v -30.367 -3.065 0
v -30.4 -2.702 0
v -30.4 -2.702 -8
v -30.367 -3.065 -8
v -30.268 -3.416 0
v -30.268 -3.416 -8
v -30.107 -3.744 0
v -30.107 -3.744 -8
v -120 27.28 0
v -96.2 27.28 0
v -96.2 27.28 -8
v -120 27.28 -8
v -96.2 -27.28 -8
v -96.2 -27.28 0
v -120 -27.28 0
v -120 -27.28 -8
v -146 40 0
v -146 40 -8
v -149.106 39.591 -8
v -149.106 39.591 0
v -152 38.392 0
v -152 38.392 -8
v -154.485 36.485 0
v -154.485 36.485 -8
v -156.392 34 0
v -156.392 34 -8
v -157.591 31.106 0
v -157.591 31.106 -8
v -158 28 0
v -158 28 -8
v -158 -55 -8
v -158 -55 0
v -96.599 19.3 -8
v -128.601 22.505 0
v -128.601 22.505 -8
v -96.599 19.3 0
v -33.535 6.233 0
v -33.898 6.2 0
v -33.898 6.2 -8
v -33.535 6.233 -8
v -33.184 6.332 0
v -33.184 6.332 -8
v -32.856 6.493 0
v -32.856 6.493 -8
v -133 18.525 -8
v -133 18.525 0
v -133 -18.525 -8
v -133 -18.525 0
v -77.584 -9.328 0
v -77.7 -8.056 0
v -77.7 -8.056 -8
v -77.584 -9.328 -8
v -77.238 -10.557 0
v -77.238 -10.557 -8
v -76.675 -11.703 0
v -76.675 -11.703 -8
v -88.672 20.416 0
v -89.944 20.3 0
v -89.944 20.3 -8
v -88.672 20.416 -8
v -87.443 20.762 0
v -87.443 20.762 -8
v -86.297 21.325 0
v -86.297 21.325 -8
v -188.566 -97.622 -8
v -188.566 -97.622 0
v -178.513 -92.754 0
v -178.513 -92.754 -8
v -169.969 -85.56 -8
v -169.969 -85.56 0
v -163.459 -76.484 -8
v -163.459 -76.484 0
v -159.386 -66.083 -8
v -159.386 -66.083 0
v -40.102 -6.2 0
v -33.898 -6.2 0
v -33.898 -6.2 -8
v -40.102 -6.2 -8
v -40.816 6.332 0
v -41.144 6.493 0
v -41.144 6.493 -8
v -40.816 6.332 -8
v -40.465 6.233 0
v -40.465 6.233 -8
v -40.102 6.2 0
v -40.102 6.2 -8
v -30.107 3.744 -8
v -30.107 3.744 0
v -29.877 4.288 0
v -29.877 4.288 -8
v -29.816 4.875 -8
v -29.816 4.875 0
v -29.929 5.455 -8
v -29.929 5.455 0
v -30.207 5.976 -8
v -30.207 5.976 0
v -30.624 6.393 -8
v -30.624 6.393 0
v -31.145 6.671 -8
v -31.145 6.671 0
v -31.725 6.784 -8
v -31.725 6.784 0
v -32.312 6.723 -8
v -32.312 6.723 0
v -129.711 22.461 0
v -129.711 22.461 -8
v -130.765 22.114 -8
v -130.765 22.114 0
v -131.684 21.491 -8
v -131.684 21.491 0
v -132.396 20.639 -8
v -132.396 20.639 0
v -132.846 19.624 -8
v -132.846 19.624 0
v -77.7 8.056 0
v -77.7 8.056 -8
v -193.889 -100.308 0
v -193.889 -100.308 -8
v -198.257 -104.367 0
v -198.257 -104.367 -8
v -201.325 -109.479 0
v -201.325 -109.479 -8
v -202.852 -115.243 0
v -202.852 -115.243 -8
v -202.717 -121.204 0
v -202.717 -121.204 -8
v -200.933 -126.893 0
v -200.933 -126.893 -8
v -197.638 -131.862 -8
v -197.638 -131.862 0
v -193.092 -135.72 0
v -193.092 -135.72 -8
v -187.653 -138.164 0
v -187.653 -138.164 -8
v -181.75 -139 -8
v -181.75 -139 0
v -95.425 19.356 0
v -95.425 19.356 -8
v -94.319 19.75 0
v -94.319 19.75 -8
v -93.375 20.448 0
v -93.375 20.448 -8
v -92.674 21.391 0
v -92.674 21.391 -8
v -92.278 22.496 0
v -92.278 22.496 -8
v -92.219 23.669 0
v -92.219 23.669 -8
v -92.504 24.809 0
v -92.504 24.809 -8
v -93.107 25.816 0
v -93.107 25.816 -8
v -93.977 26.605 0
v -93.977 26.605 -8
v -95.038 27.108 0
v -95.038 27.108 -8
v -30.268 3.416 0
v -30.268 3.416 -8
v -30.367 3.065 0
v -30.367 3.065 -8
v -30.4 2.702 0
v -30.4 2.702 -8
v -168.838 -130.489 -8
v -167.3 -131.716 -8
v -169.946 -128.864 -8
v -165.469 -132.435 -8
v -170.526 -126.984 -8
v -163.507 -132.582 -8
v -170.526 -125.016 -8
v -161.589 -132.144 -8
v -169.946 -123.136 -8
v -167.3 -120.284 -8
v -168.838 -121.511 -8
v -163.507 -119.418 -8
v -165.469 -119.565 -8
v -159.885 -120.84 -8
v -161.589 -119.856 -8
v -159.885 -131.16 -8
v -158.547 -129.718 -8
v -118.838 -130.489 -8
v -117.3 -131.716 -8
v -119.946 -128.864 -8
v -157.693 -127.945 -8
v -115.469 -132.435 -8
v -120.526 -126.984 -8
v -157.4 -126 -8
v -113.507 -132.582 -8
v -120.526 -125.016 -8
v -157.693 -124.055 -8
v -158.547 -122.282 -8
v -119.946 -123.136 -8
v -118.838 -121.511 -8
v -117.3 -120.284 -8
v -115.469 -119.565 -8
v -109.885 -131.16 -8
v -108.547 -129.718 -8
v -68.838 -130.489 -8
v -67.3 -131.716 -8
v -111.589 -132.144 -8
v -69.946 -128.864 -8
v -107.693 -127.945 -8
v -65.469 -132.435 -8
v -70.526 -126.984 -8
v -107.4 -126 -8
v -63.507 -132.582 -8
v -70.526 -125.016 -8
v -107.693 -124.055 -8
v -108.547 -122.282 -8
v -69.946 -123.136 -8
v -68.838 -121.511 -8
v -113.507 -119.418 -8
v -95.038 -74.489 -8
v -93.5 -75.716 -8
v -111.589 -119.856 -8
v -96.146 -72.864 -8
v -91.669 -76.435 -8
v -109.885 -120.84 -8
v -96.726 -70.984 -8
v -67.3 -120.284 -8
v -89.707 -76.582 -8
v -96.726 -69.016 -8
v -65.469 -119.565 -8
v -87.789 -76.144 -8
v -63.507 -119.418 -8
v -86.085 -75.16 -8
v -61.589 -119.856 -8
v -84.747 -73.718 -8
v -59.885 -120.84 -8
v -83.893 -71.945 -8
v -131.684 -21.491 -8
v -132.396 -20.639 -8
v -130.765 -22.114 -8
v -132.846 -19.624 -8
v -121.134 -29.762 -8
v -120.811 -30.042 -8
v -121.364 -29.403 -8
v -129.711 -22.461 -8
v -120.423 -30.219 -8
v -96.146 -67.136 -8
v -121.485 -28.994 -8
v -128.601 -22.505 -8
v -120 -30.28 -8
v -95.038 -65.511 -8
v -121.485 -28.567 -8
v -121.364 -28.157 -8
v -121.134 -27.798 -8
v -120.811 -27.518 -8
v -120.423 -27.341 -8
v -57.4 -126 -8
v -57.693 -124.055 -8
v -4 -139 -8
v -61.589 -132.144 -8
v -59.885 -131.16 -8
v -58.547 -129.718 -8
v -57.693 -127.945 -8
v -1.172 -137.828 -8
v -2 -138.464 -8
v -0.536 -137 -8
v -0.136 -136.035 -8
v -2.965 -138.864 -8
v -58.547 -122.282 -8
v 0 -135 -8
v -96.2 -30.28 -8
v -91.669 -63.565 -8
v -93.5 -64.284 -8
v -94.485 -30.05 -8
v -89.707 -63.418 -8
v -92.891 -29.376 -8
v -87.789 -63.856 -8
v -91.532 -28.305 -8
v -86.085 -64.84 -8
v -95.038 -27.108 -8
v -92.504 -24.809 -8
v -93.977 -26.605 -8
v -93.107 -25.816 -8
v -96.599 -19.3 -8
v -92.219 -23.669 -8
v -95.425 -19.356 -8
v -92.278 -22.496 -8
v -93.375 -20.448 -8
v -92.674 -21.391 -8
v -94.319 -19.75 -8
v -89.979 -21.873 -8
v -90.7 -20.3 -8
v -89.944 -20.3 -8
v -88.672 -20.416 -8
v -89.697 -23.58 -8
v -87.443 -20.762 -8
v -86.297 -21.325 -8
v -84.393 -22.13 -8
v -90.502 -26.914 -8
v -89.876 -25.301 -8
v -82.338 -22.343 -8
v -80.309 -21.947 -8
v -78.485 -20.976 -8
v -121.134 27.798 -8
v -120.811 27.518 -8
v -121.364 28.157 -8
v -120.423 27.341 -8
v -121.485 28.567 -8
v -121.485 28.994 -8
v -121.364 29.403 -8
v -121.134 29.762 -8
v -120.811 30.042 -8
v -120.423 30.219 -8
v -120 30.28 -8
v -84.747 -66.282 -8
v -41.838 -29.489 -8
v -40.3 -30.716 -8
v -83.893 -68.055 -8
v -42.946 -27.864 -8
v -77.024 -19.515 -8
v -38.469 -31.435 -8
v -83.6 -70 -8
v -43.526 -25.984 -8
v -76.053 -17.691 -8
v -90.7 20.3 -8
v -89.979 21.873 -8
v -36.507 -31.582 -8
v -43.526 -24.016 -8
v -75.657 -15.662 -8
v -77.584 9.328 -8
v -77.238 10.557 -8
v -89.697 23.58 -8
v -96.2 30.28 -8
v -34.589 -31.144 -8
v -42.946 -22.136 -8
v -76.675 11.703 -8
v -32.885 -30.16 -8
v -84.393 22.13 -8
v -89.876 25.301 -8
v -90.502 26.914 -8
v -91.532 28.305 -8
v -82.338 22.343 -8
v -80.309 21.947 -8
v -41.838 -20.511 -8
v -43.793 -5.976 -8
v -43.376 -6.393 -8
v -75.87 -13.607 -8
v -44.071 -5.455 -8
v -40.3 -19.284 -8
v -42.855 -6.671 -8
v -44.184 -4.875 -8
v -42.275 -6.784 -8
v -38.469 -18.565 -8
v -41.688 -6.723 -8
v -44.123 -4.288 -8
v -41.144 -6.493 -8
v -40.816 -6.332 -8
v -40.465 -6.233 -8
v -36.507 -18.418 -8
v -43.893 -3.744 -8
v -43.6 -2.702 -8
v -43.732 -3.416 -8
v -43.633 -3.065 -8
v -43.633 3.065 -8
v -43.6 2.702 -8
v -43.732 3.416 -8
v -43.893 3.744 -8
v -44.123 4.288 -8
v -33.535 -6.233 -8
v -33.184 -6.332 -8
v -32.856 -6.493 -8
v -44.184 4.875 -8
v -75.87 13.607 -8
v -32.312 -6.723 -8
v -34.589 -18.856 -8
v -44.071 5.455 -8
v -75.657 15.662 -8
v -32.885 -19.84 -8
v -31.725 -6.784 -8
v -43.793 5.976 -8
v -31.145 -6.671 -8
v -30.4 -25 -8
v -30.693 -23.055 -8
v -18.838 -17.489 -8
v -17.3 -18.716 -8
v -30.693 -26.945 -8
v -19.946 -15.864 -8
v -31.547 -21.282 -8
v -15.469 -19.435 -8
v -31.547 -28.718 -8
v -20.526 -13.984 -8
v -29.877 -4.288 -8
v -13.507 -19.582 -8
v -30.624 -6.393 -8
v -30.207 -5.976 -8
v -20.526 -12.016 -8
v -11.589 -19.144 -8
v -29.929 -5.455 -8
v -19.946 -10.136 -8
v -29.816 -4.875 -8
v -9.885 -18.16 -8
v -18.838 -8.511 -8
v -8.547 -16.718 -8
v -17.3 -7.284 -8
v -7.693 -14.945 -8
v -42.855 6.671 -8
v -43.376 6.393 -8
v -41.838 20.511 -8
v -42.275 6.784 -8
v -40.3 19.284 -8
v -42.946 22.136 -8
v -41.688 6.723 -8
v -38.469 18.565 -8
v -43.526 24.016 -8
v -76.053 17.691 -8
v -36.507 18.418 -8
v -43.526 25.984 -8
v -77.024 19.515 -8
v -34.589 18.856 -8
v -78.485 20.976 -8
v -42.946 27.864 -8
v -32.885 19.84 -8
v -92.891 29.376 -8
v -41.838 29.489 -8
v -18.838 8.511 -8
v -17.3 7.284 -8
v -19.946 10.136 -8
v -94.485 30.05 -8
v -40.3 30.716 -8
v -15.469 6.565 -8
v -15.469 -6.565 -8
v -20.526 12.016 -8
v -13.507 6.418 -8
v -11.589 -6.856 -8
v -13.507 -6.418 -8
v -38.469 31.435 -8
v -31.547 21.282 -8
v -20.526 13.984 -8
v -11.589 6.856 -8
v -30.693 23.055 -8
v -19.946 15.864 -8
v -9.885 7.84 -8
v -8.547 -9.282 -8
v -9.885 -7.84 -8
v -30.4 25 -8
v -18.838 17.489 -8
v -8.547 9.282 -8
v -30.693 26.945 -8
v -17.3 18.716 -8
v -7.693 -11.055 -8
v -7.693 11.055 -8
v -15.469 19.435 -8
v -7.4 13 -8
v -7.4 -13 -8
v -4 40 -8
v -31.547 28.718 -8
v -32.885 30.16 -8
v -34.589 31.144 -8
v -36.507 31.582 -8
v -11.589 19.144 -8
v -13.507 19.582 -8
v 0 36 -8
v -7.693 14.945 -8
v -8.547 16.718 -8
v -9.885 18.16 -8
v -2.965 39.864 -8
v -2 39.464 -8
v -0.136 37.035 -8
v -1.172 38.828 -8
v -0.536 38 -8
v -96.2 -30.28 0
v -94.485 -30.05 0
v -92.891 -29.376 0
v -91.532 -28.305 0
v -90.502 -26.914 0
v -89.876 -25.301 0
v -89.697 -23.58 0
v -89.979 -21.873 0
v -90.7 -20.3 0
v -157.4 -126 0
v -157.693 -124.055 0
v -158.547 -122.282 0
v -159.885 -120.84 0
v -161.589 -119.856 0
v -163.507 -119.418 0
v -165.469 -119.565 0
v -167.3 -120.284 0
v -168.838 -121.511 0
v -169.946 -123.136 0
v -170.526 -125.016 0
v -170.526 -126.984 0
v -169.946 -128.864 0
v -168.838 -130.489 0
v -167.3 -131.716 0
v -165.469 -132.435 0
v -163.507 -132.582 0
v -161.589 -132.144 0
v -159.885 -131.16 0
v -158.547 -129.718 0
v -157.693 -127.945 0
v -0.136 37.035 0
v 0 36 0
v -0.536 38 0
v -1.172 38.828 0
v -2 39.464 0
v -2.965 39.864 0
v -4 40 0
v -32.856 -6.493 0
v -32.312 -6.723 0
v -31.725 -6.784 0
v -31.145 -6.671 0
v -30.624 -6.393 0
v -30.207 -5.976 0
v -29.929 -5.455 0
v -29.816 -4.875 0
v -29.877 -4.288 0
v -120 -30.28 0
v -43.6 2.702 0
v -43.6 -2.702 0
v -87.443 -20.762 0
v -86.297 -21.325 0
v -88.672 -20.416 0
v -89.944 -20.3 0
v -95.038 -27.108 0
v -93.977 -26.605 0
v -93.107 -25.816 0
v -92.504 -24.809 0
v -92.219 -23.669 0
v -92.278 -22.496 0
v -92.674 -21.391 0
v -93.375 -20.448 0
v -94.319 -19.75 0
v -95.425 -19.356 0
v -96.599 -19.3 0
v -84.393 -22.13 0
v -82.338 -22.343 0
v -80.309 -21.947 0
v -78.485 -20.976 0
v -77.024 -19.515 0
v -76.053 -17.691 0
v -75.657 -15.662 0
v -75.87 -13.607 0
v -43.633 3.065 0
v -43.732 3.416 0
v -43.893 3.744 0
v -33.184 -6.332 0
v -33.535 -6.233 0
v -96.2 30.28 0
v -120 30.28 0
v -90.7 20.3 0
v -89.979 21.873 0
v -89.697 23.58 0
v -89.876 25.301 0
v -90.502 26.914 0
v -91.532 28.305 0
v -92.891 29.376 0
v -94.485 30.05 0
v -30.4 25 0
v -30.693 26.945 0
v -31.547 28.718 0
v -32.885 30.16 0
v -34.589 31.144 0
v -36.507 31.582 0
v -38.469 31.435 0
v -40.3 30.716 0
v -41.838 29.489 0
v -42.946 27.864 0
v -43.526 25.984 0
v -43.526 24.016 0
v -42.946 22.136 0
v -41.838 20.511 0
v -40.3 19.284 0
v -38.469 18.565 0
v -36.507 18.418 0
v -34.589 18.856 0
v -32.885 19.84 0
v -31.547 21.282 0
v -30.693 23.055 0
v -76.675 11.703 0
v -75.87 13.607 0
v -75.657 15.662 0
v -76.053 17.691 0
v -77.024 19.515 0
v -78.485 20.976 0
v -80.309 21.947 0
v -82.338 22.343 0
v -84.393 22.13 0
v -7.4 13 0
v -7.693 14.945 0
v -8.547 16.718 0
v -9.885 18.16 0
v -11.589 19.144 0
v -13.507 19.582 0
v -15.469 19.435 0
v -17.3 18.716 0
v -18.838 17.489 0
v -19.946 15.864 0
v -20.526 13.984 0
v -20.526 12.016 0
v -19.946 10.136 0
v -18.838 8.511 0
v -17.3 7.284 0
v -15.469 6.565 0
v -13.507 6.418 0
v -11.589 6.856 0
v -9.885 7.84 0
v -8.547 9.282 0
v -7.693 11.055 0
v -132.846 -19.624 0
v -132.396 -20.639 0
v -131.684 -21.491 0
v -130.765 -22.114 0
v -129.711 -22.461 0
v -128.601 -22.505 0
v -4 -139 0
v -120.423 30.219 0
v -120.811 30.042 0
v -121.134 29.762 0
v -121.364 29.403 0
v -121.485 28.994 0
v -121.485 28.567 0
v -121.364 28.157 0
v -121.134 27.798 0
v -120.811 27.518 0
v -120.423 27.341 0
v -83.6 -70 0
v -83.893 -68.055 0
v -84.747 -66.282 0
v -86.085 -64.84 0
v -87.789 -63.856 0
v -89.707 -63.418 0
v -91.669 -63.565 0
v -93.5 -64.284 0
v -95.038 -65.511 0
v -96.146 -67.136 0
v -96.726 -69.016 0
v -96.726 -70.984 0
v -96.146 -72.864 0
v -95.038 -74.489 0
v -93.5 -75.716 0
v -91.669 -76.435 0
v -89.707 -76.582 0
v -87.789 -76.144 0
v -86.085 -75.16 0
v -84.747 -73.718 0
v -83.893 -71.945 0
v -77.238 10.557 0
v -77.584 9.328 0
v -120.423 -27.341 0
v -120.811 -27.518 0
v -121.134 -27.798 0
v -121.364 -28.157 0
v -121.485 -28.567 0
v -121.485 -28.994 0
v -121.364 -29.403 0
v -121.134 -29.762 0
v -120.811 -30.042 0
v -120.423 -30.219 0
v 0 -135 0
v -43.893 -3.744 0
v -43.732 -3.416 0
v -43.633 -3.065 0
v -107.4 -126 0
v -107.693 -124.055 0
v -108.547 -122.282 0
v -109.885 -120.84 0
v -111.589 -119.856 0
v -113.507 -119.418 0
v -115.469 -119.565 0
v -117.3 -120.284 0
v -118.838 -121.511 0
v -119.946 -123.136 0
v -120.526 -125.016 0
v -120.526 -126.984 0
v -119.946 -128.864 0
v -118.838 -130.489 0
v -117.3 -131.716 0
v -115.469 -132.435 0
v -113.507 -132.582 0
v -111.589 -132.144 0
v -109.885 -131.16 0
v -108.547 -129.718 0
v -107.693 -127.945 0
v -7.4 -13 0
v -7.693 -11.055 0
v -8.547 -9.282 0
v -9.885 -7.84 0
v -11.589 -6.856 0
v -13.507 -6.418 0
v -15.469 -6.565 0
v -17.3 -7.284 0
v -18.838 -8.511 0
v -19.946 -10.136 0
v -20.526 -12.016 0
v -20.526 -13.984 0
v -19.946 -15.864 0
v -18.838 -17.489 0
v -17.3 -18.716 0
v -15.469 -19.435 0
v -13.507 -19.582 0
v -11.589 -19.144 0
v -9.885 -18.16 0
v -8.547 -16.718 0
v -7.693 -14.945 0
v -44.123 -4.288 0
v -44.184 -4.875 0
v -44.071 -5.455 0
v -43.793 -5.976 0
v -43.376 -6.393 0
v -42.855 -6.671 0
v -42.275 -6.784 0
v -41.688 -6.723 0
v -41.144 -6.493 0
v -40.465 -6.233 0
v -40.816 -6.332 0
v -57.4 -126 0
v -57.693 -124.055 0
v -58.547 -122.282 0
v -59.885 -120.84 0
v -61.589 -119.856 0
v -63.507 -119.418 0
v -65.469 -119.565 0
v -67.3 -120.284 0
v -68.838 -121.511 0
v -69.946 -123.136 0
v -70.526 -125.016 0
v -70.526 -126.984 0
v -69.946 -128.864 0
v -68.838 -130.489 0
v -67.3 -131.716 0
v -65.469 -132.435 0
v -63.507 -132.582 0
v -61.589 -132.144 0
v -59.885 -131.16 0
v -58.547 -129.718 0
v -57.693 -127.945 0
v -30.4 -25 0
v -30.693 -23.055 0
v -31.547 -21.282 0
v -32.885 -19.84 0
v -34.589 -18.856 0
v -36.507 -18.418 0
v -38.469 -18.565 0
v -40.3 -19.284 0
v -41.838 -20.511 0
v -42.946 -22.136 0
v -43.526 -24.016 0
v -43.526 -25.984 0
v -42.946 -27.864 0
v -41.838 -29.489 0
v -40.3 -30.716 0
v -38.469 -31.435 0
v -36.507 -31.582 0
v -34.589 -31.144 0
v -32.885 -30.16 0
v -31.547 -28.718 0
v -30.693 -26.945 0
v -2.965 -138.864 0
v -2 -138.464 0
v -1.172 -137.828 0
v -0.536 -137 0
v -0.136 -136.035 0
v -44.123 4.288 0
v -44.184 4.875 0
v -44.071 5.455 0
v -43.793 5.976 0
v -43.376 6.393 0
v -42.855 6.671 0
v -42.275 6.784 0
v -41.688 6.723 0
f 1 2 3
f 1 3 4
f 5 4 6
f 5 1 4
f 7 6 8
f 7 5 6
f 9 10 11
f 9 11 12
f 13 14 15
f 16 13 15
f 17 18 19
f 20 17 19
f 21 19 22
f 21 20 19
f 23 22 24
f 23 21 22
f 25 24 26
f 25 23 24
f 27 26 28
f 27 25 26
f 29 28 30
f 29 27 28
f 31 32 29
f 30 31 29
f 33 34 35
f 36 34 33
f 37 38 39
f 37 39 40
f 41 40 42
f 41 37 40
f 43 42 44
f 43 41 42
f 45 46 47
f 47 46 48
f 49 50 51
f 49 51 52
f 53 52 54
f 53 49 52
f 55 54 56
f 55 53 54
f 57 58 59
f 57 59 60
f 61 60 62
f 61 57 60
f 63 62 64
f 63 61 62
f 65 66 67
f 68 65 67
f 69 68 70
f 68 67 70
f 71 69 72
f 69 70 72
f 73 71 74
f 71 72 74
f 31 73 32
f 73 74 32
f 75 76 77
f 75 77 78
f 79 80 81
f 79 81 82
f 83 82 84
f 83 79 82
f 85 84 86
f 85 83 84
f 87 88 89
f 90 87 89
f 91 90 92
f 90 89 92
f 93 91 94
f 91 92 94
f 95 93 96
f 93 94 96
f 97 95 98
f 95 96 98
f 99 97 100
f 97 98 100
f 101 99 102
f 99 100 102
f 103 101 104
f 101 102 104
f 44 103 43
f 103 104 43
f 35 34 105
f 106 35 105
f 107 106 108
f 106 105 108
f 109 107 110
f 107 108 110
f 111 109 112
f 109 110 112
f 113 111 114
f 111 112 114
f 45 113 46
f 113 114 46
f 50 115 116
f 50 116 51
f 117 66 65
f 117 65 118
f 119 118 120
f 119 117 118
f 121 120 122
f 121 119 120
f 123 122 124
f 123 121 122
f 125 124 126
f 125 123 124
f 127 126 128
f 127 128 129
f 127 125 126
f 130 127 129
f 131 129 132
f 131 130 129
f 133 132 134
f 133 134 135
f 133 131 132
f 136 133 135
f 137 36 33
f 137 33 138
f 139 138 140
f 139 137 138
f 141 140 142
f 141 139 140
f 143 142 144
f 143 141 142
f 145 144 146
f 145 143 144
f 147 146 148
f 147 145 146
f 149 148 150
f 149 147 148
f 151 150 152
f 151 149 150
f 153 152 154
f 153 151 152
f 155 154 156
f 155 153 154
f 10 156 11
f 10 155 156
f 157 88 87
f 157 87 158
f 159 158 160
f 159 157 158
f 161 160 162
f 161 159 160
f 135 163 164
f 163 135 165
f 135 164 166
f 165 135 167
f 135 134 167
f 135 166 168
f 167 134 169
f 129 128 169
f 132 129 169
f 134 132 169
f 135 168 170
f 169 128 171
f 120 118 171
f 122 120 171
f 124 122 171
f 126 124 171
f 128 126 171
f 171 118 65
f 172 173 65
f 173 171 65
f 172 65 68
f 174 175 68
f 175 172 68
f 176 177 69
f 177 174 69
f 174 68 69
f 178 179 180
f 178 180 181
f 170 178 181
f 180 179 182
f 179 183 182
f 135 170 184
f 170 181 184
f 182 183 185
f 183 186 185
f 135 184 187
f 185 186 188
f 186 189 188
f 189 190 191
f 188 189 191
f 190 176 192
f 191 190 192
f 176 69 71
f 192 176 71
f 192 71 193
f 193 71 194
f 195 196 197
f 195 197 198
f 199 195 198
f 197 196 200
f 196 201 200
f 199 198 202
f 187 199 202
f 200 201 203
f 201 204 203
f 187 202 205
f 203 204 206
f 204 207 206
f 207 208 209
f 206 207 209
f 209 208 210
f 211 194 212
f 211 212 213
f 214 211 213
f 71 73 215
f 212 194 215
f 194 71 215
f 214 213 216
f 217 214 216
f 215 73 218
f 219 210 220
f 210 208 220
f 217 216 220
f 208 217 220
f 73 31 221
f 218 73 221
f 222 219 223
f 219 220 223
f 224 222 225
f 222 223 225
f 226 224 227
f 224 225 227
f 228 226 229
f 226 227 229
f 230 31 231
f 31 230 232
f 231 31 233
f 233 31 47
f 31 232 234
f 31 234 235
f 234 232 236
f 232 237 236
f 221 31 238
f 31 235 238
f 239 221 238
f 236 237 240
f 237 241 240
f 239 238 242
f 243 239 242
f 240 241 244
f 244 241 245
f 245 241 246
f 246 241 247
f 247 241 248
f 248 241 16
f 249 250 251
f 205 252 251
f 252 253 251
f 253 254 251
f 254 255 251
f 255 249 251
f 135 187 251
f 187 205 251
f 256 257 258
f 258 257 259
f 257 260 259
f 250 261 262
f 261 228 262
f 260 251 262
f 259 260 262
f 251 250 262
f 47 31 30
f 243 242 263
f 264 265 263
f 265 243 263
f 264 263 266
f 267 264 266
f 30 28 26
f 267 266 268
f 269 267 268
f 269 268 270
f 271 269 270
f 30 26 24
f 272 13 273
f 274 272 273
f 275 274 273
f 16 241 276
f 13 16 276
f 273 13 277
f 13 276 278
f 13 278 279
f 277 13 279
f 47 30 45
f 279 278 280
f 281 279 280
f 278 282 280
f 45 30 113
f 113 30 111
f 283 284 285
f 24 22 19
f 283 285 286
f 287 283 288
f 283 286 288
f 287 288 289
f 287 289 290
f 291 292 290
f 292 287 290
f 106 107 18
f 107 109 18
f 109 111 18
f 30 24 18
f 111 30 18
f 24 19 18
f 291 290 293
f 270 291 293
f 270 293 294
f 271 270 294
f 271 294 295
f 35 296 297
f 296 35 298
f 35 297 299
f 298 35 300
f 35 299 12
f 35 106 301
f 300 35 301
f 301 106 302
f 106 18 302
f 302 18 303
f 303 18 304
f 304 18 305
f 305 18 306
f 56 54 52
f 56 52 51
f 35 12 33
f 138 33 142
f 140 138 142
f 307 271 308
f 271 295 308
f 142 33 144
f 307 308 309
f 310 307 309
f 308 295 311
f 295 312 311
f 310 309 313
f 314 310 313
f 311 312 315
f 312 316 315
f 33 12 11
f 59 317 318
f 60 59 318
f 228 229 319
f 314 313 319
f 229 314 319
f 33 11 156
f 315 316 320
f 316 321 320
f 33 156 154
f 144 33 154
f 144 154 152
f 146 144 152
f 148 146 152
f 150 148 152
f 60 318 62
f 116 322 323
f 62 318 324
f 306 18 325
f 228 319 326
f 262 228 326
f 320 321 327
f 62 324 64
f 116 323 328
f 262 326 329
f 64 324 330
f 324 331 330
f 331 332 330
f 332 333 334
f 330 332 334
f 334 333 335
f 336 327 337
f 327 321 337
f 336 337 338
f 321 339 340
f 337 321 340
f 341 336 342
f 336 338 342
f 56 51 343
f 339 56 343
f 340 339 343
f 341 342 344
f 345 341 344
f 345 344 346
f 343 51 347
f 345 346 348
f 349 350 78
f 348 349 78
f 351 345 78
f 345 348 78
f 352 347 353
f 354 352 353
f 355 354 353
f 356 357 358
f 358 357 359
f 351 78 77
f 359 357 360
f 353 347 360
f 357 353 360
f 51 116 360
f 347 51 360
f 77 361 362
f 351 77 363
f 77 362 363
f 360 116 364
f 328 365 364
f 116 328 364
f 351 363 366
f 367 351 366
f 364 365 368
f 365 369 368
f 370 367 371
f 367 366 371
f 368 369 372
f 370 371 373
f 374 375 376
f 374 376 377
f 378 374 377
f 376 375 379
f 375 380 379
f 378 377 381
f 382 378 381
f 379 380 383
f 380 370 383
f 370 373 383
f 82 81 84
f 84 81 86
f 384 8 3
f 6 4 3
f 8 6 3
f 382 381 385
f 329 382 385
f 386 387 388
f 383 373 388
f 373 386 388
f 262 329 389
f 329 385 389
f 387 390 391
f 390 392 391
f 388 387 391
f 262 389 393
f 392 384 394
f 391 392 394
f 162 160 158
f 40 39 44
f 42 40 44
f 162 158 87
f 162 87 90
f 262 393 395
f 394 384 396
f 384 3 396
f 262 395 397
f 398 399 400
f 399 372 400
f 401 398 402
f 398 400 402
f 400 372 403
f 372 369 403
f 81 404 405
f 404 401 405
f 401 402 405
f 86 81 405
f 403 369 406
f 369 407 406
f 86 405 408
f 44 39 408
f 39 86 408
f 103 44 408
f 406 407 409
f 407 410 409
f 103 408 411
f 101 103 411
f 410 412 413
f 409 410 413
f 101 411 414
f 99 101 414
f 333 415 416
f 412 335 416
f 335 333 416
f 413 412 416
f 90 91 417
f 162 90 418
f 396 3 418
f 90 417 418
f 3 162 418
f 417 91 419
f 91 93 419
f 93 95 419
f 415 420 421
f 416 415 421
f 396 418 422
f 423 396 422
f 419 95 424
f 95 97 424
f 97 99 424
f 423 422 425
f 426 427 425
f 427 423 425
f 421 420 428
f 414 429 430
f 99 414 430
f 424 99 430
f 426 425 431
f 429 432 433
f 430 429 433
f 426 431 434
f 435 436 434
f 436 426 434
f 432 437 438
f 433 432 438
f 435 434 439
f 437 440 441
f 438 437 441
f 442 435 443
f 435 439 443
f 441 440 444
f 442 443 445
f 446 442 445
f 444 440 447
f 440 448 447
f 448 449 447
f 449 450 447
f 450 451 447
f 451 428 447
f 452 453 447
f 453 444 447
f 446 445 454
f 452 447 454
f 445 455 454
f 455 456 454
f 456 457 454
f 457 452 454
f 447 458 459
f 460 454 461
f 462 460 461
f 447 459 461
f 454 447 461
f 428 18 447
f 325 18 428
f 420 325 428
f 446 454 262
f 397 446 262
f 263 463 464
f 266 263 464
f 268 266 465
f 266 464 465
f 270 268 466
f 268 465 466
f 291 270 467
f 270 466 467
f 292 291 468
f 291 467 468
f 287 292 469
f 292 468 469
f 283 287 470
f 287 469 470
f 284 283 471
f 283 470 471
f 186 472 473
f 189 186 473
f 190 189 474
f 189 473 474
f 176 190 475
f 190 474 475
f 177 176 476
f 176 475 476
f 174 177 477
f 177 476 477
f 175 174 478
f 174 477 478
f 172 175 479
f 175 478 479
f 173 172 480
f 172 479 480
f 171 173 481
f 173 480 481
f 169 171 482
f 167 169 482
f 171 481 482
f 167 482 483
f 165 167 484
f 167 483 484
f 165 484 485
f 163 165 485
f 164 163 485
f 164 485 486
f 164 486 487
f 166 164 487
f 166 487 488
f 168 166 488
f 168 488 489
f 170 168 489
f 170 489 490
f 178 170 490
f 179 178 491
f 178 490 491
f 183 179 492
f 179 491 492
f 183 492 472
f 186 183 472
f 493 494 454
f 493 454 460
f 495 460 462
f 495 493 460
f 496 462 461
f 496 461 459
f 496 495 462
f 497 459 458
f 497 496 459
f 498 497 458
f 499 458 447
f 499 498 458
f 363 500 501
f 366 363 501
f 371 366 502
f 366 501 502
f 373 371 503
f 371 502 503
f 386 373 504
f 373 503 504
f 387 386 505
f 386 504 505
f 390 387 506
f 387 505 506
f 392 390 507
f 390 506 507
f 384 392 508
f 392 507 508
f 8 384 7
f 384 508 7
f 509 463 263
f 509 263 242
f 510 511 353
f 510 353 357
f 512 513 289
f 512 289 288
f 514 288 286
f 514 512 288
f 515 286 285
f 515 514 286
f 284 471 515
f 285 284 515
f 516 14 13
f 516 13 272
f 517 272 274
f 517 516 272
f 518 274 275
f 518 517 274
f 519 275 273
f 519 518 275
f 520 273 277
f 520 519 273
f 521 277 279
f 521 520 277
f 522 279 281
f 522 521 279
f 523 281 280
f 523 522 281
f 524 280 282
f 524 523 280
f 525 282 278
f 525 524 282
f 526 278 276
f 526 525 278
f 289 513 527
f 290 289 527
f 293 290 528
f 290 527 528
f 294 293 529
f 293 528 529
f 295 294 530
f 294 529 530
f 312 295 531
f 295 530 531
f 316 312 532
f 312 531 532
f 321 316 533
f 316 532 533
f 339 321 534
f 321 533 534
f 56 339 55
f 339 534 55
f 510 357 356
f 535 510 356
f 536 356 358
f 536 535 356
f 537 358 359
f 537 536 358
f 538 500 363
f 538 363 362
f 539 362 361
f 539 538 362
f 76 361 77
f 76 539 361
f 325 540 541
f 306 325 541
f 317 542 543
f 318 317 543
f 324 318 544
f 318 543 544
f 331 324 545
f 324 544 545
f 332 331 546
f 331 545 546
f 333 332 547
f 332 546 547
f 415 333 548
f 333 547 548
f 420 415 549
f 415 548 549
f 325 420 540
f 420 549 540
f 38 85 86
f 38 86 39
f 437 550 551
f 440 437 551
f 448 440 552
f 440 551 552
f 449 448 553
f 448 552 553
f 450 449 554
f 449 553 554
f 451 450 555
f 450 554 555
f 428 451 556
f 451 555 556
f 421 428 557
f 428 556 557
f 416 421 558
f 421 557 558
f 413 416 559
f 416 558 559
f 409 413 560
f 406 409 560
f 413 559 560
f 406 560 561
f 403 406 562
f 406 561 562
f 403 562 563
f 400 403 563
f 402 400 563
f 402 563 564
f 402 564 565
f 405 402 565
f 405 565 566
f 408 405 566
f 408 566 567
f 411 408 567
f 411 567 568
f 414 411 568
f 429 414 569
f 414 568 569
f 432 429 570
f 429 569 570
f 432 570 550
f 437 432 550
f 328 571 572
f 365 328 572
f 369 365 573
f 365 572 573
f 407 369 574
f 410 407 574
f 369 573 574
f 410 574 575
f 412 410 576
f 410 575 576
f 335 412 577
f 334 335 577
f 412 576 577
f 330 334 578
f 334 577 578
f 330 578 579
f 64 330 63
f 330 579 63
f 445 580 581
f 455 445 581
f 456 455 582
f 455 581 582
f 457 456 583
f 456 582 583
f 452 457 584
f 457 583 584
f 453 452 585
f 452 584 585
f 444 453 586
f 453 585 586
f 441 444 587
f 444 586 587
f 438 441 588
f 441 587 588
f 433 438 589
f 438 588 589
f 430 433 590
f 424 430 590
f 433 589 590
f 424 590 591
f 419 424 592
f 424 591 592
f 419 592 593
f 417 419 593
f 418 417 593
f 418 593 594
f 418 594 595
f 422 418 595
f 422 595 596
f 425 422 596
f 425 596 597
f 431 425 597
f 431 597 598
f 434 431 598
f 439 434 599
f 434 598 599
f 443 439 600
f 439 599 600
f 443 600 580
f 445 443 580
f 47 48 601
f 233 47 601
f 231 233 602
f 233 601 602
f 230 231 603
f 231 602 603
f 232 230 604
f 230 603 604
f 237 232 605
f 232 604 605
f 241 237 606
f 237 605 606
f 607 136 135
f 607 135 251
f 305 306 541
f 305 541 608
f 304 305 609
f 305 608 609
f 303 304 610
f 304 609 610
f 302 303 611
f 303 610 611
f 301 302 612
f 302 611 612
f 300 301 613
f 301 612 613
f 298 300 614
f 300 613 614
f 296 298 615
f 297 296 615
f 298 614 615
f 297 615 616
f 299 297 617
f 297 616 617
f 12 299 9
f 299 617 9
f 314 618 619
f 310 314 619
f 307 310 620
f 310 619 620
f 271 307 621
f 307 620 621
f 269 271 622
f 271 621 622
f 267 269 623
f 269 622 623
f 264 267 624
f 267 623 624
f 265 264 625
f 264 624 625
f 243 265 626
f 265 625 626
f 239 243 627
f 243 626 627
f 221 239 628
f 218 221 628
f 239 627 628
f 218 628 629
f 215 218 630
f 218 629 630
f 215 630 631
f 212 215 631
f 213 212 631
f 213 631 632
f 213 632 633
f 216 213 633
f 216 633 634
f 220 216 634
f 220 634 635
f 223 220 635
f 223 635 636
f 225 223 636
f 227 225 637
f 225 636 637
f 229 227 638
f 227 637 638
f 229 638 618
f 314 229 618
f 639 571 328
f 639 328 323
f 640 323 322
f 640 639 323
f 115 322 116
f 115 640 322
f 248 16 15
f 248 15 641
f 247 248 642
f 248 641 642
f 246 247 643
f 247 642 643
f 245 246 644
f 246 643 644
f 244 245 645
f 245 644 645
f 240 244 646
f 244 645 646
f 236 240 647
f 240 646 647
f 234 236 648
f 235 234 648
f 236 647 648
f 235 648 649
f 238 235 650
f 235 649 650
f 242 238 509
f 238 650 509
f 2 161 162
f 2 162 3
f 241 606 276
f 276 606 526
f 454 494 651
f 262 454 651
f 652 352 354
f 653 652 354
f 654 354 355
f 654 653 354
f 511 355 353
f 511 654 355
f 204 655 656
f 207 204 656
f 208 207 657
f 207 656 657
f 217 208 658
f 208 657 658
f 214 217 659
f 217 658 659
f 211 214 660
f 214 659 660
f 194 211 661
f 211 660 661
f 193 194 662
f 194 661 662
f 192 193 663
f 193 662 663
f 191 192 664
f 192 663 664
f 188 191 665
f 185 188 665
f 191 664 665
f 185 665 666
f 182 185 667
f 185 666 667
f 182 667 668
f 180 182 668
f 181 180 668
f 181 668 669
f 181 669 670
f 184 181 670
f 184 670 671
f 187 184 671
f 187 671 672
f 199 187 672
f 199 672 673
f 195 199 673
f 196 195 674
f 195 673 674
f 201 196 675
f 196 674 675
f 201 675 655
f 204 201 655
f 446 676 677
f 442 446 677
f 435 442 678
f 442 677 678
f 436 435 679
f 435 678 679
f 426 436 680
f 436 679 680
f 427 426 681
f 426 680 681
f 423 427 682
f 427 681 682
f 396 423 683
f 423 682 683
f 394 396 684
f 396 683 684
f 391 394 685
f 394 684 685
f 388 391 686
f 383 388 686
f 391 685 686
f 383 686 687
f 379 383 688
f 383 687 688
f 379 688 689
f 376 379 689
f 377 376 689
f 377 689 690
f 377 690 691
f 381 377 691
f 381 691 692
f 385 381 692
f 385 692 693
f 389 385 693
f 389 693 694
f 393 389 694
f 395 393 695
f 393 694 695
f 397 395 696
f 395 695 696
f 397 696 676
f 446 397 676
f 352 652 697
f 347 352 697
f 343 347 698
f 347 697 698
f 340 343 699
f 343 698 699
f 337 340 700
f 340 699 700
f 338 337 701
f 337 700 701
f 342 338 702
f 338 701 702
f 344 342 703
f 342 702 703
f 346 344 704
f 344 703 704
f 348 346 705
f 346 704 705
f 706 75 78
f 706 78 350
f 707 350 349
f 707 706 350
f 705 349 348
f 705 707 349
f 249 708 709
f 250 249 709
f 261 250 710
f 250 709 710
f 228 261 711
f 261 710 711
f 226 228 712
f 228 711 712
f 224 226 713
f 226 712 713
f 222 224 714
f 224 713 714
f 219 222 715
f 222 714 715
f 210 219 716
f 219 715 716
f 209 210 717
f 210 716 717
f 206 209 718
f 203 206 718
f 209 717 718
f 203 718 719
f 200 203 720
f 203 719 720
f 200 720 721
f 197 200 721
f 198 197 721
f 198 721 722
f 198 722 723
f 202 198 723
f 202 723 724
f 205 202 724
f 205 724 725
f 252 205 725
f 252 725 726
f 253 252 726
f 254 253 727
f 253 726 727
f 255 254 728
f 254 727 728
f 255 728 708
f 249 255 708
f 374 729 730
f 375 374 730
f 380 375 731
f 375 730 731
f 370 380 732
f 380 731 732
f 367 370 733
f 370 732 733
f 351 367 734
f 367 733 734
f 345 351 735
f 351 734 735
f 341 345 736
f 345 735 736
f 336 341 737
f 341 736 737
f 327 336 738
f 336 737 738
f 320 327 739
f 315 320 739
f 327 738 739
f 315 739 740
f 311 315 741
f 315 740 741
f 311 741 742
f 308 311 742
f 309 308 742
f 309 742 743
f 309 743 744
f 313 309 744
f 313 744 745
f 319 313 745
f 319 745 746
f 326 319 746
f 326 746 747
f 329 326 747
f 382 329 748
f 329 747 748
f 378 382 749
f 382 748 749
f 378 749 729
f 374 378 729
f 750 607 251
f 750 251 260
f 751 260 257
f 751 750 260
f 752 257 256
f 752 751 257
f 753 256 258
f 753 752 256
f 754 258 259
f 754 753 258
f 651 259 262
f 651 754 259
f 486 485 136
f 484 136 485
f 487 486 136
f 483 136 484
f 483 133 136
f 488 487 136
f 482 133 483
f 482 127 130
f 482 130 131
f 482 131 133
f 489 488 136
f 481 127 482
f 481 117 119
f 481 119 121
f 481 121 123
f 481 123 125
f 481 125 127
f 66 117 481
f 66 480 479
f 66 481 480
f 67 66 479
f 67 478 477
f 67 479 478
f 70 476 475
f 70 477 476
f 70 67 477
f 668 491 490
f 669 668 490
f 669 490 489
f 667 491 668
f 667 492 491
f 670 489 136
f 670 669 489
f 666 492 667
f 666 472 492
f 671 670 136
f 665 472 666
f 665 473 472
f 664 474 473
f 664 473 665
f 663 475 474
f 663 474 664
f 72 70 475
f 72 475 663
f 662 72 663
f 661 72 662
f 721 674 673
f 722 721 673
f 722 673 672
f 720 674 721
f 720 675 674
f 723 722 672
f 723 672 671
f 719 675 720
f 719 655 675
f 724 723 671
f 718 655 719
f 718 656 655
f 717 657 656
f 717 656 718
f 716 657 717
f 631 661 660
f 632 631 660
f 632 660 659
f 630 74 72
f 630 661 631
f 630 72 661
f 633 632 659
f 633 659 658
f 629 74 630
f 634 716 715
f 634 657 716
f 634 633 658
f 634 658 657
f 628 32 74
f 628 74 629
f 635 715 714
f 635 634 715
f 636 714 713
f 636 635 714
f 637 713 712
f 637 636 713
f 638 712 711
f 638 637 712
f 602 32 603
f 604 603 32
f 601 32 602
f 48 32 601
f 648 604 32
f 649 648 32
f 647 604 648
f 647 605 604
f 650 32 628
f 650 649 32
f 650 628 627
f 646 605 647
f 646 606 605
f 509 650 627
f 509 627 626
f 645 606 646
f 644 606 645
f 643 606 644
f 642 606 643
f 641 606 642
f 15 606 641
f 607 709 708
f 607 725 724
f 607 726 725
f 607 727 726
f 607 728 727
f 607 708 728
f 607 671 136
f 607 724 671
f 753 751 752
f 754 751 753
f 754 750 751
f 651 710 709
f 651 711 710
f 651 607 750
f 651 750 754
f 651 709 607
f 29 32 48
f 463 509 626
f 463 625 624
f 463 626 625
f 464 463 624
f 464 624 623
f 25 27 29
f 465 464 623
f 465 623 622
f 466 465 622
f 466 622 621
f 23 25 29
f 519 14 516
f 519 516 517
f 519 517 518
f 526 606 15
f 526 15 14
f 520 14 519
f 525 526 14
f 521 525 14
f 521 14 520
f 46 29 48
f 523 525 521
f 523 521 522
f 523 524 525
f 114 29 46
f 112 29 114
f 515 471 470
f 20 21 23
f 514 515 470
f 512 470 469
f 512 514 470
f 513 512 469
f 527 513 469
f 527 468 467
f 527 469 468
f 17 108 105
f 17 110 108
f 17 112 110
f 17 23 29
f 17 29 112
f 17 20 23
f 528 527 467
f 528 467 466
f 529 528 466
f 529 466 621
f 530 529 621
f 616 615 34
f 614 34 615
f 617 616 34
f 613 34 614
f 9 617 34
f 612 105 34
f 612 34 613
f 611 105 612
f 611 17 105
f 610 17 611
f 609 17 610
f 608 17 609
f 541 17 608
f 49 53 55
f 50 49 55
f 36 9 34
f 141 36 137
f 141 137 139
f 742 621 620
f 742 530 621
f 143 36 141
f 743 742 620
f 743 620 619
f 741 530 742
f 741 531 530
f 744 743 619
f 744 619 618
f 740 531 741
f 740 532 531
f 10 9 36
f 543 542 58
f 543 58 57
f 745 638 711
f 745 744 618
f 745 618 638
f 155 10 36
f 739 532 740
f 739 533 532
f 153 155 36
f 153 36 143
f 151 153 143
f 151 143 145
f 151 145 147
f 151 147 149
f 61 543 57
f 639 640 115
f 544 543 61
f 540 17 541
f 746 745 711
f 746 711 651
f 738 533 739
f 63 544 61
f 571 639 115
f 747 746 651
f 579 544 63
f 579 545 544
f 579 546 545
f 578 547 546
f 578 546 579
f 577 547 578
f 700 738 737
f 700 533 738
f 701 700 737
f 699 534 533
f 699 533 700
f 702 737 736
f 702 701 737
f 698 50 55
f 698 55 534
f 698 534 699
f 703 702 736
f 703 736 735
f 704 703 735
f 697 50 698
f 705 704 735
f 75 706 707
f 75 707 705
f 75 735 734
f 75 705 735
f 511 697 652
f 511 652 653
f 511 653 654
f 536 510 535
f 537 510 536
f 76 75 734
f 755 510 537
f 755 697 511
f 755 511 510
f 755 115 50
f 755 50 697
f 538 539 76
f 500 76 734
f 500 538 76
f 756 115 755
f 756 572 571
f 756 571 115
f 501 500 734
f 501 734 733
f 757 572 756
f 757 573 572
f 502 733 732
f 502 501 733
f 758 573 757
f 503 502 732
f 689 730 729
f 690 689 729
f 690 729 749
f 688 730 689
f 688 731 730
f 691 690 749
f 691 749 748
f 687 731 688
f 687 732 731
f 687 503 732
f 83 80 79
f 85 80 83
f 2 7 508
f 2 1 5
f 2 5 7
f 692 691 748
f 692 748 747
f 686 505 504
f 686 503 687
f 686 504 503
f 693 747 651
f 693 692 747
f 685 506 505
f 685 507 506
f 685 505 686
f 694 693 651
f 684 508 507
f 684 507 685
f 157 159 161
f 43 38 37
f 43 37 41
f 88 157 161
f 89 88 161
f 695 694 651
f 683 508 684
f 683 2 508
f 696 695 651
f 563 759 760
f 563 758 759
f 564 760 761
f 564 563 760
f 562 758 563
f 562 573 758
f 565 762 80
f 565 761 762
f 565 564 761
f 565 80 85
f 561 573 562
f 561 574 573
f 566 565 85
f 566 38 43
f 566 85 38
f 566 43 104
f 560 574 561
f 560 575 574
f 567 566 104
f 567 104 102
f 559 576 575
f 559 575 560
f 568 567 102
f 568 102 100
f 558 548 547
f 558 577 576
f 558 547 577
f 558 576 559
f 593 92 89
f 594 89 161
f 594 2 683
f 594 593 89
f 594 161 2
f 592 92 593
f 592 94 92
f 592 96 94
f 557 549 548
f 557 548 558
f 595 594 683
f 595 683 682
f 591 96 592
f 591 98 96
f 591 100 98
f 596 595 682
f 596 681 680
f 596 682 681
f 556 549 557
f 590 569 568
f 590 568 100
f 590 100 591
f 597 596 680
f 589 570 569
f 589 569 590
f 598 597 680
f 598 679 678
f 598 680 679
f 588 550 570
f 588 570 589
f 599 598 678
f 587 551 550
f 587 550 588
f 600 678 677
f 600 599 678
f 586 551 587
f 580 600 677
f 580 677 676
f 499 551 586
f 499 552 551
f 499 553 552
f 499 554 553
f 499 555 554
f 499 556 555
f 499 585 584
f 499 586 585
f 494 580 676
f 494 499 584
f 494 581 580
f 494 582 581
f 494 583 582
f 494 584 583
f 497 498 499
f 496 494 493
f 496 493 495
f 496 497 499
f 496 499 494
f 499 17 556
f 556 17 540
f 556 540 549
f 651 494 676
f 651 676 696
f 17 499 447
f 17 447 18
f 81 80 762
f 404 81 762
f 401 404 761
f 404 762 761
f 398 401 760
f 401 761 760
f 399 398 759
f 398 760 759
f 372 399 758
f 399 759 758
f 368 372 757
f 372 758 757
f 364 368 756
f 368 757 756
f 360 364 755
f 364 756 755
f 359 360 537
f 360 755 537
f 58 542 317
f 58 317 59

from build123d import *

# Parameters (mm, degrees)
SKETCH_R  = 6.6
PAD_DEPTH = 8


with BuildPart() as part:
    # Sketch → Pad (new body)
    with BuildSketch(Plane.XY):
        with BuildLine():
            Line((-4, 40), (-146, 40))
            ThreePointArc((-146, 40), (-154.485281, 36.485281), (-158, 28))
            Line((-158, -55), (-158, 28))
            ThreePointArc((-188.565904, -97.622258), (-166.431336, -81.224661), (-158, -55))
            ThreePointArc((-188.565904, -97.622258), (-202.717412, -121.203739), (-181.74971, -139))
            Line((-181.74971, -139), (-4, -139))
            ThreePointArc((-4, -139), (-1.171573, -137.828427), (0, -135))
            Line((0, 36), (0, -135))
            ThreePointArc((0, 36), (-1.171573, 38.828427), (-4, 40))
        make_face()
        with Locations((-37, 25)):
            Circle(SKETCH_R, mode=Mode.SUBTRACT)
        with Locations((-37, -25)):
            Circle(SKETCH_R, mode=Mode.SUBTRACT)
        with Locations((-14, 13)):
            Circle(SKETCH_R, mode=Mode.SUBTRACT)
        with Locations((-14, -13)):
            Circle(SKETCH_R, mode=Mode.SUBTRACT)
        with Locations((-164, -126)):
            Circle(SKETCH_R, mode=Mode.SUBTRACT)
        with Locations((-114, -126)):
            Circle(SKETCH_R, mode=Mode.SUBTRACT)
        with Locations((-64, -126)):
            Circle(SKETCH_R, mode=Mode.SUBTRACT)
        with Locations((-90.2, -70)):
            Circle(SKETCH_R, mode=Mode.SUBTRACT)
        with BuildLine():
            Line((-40.101765, 6.2), (-33.898235, 6.2))
            ThreePointArc((-33.898235, 6.2), (-33.357039, 6.274615), (-32.856224, 6.492893))
            ThreePointArc((-30.107107, 3.743776), (-30.4, 6.2), (-32.856224, 6.492893))
            ThreePointArc((-30.107107, 3.743776), (-30.325385, 3.242961), (-30.4, 2.701765))
            Line((-30.4, 2.701765), (-30.4, -2.701765))
            ThreePointArc((-30.4, -2.701765), (-30.325385, -3.242961), (-30.107107, -3.743776))
            ThreePointArc((-32.856224, -6.492893), (-30.4, -6.2), (-30.107107, -3.743776))
            ThreePointArc((-32.856224, -6.492893), (-33.357039, -6.274615), (-33.898235, -6.2))
            Line((-33.898235, -6.2), (-40.101765, -6.2))
            ThreePointArc((-40.101765, -6.2), (-40.642961, -6.274615), (-41.143776, -6.492893))
            ThreePointArc((-43.892893, -3.743776), (-43.6, -6.2), (-41.143776, -6.492893))
            ThreePointArc((-43.892893, -3.743776), (-43.674615, -3.242961), (-43.6, -2.701765))
            Line((-43.6, -2.701765), (-43.6, 2.701765))
            ThreePointArc((-43.6, 2.701765), (-43.674615, 3.242961), (-43.892893, 3.743776))
            ThreePointArc((-41.143776, 6.492893), (-43.6, 6.2), (-43.892893, 3.743776))
            ThreePointArc((-41.143776, 6.492893), (-40.642961, 6.274615), (-40.101765, 6.2))
        make_face(mode=Mode.SUBTRACT)
        with BuildLine():
            Line((-90.7, 20.3), (-89.943823, 20.3))
            ThreePointArc((-89.943823, 20.3), (-88.049637, 20.561153), (-86.296785, 21.325126))
            ThreePointArc((-76.674874, 11.703215), (-77.700001, 20.3), (-86.296785, 21.325126))
            ThreePointArc((-76.674874, 11.703215), (-77.438847, 9.950364), (-77.7, 8.056178))
            Line((-77.7, 8.056178), (-77.7, -8.056178))
            ThreePointArc((-77.7, -8.056178), (-77.438847, -9.950365), (-76.674874, -11.703216))
            ThreePointArc((-86.296785, -21.325126), (-77.7, -20.3), (-76.674874, -11.703216))
            ThreePointArc((-86.296785, -21.325126), (-88.049636, -20.561153), (-89.943822, -20.3))
            Line((-90.7, -20.3), (-89.943822, -20.3))
            ThreePointArc((-96.2, -30.280093), (-90.502363, -26.91448), (-90.7, -20.3))
            Line((-96.2, -30.280093), (-120, -30.280093))
            ThreePointArc((-120, -27.280093), (-121.5, -28.780093), (-120, -30.280093))
            Line((-96.2, -27.280093), (-120, -27.280093))
            ThreePointArc((-96.2, -27.280093), (-92.20498, -23.080559), (-96.598572, -19.3))
            Line((-128.601428, -22.504808), (-96.598572, -19.3))
            ThreePointArc((-133, -18.524715), (-131.683814, -21.490713), (-128.601428, -22.504808))
            Line((-133, 18.524715), (-133, -18.524715))
            ThreePointArc((-128.601428, 22.504808), (-131.683814, 21.490713), (-133, 18.524715))
            Line((-128.601428, 22.504808), (-96.598572, 19.3))
            ThreePointArc((-96.598572, 19.3), (-92.20498, 23.080559), (-96.2, 27.280093))
            Line((-96.2, 27.280093), (-120, 27.280093))
            ThreePointArc((-120, 30.280093), (-121.5, 28.780093), (-120, 27.280093))
            Line((-96.2, 30.280093), (-120, 30.280093))
            ThreePointArc((-90.7, 20.3), (-90.502363, 26.91448), (-96.2, 30.280093))
        make_face(mode=Mode.SUBTRACT)
    extrude(amount=-PAD_DEPTH)


solid = part.part
